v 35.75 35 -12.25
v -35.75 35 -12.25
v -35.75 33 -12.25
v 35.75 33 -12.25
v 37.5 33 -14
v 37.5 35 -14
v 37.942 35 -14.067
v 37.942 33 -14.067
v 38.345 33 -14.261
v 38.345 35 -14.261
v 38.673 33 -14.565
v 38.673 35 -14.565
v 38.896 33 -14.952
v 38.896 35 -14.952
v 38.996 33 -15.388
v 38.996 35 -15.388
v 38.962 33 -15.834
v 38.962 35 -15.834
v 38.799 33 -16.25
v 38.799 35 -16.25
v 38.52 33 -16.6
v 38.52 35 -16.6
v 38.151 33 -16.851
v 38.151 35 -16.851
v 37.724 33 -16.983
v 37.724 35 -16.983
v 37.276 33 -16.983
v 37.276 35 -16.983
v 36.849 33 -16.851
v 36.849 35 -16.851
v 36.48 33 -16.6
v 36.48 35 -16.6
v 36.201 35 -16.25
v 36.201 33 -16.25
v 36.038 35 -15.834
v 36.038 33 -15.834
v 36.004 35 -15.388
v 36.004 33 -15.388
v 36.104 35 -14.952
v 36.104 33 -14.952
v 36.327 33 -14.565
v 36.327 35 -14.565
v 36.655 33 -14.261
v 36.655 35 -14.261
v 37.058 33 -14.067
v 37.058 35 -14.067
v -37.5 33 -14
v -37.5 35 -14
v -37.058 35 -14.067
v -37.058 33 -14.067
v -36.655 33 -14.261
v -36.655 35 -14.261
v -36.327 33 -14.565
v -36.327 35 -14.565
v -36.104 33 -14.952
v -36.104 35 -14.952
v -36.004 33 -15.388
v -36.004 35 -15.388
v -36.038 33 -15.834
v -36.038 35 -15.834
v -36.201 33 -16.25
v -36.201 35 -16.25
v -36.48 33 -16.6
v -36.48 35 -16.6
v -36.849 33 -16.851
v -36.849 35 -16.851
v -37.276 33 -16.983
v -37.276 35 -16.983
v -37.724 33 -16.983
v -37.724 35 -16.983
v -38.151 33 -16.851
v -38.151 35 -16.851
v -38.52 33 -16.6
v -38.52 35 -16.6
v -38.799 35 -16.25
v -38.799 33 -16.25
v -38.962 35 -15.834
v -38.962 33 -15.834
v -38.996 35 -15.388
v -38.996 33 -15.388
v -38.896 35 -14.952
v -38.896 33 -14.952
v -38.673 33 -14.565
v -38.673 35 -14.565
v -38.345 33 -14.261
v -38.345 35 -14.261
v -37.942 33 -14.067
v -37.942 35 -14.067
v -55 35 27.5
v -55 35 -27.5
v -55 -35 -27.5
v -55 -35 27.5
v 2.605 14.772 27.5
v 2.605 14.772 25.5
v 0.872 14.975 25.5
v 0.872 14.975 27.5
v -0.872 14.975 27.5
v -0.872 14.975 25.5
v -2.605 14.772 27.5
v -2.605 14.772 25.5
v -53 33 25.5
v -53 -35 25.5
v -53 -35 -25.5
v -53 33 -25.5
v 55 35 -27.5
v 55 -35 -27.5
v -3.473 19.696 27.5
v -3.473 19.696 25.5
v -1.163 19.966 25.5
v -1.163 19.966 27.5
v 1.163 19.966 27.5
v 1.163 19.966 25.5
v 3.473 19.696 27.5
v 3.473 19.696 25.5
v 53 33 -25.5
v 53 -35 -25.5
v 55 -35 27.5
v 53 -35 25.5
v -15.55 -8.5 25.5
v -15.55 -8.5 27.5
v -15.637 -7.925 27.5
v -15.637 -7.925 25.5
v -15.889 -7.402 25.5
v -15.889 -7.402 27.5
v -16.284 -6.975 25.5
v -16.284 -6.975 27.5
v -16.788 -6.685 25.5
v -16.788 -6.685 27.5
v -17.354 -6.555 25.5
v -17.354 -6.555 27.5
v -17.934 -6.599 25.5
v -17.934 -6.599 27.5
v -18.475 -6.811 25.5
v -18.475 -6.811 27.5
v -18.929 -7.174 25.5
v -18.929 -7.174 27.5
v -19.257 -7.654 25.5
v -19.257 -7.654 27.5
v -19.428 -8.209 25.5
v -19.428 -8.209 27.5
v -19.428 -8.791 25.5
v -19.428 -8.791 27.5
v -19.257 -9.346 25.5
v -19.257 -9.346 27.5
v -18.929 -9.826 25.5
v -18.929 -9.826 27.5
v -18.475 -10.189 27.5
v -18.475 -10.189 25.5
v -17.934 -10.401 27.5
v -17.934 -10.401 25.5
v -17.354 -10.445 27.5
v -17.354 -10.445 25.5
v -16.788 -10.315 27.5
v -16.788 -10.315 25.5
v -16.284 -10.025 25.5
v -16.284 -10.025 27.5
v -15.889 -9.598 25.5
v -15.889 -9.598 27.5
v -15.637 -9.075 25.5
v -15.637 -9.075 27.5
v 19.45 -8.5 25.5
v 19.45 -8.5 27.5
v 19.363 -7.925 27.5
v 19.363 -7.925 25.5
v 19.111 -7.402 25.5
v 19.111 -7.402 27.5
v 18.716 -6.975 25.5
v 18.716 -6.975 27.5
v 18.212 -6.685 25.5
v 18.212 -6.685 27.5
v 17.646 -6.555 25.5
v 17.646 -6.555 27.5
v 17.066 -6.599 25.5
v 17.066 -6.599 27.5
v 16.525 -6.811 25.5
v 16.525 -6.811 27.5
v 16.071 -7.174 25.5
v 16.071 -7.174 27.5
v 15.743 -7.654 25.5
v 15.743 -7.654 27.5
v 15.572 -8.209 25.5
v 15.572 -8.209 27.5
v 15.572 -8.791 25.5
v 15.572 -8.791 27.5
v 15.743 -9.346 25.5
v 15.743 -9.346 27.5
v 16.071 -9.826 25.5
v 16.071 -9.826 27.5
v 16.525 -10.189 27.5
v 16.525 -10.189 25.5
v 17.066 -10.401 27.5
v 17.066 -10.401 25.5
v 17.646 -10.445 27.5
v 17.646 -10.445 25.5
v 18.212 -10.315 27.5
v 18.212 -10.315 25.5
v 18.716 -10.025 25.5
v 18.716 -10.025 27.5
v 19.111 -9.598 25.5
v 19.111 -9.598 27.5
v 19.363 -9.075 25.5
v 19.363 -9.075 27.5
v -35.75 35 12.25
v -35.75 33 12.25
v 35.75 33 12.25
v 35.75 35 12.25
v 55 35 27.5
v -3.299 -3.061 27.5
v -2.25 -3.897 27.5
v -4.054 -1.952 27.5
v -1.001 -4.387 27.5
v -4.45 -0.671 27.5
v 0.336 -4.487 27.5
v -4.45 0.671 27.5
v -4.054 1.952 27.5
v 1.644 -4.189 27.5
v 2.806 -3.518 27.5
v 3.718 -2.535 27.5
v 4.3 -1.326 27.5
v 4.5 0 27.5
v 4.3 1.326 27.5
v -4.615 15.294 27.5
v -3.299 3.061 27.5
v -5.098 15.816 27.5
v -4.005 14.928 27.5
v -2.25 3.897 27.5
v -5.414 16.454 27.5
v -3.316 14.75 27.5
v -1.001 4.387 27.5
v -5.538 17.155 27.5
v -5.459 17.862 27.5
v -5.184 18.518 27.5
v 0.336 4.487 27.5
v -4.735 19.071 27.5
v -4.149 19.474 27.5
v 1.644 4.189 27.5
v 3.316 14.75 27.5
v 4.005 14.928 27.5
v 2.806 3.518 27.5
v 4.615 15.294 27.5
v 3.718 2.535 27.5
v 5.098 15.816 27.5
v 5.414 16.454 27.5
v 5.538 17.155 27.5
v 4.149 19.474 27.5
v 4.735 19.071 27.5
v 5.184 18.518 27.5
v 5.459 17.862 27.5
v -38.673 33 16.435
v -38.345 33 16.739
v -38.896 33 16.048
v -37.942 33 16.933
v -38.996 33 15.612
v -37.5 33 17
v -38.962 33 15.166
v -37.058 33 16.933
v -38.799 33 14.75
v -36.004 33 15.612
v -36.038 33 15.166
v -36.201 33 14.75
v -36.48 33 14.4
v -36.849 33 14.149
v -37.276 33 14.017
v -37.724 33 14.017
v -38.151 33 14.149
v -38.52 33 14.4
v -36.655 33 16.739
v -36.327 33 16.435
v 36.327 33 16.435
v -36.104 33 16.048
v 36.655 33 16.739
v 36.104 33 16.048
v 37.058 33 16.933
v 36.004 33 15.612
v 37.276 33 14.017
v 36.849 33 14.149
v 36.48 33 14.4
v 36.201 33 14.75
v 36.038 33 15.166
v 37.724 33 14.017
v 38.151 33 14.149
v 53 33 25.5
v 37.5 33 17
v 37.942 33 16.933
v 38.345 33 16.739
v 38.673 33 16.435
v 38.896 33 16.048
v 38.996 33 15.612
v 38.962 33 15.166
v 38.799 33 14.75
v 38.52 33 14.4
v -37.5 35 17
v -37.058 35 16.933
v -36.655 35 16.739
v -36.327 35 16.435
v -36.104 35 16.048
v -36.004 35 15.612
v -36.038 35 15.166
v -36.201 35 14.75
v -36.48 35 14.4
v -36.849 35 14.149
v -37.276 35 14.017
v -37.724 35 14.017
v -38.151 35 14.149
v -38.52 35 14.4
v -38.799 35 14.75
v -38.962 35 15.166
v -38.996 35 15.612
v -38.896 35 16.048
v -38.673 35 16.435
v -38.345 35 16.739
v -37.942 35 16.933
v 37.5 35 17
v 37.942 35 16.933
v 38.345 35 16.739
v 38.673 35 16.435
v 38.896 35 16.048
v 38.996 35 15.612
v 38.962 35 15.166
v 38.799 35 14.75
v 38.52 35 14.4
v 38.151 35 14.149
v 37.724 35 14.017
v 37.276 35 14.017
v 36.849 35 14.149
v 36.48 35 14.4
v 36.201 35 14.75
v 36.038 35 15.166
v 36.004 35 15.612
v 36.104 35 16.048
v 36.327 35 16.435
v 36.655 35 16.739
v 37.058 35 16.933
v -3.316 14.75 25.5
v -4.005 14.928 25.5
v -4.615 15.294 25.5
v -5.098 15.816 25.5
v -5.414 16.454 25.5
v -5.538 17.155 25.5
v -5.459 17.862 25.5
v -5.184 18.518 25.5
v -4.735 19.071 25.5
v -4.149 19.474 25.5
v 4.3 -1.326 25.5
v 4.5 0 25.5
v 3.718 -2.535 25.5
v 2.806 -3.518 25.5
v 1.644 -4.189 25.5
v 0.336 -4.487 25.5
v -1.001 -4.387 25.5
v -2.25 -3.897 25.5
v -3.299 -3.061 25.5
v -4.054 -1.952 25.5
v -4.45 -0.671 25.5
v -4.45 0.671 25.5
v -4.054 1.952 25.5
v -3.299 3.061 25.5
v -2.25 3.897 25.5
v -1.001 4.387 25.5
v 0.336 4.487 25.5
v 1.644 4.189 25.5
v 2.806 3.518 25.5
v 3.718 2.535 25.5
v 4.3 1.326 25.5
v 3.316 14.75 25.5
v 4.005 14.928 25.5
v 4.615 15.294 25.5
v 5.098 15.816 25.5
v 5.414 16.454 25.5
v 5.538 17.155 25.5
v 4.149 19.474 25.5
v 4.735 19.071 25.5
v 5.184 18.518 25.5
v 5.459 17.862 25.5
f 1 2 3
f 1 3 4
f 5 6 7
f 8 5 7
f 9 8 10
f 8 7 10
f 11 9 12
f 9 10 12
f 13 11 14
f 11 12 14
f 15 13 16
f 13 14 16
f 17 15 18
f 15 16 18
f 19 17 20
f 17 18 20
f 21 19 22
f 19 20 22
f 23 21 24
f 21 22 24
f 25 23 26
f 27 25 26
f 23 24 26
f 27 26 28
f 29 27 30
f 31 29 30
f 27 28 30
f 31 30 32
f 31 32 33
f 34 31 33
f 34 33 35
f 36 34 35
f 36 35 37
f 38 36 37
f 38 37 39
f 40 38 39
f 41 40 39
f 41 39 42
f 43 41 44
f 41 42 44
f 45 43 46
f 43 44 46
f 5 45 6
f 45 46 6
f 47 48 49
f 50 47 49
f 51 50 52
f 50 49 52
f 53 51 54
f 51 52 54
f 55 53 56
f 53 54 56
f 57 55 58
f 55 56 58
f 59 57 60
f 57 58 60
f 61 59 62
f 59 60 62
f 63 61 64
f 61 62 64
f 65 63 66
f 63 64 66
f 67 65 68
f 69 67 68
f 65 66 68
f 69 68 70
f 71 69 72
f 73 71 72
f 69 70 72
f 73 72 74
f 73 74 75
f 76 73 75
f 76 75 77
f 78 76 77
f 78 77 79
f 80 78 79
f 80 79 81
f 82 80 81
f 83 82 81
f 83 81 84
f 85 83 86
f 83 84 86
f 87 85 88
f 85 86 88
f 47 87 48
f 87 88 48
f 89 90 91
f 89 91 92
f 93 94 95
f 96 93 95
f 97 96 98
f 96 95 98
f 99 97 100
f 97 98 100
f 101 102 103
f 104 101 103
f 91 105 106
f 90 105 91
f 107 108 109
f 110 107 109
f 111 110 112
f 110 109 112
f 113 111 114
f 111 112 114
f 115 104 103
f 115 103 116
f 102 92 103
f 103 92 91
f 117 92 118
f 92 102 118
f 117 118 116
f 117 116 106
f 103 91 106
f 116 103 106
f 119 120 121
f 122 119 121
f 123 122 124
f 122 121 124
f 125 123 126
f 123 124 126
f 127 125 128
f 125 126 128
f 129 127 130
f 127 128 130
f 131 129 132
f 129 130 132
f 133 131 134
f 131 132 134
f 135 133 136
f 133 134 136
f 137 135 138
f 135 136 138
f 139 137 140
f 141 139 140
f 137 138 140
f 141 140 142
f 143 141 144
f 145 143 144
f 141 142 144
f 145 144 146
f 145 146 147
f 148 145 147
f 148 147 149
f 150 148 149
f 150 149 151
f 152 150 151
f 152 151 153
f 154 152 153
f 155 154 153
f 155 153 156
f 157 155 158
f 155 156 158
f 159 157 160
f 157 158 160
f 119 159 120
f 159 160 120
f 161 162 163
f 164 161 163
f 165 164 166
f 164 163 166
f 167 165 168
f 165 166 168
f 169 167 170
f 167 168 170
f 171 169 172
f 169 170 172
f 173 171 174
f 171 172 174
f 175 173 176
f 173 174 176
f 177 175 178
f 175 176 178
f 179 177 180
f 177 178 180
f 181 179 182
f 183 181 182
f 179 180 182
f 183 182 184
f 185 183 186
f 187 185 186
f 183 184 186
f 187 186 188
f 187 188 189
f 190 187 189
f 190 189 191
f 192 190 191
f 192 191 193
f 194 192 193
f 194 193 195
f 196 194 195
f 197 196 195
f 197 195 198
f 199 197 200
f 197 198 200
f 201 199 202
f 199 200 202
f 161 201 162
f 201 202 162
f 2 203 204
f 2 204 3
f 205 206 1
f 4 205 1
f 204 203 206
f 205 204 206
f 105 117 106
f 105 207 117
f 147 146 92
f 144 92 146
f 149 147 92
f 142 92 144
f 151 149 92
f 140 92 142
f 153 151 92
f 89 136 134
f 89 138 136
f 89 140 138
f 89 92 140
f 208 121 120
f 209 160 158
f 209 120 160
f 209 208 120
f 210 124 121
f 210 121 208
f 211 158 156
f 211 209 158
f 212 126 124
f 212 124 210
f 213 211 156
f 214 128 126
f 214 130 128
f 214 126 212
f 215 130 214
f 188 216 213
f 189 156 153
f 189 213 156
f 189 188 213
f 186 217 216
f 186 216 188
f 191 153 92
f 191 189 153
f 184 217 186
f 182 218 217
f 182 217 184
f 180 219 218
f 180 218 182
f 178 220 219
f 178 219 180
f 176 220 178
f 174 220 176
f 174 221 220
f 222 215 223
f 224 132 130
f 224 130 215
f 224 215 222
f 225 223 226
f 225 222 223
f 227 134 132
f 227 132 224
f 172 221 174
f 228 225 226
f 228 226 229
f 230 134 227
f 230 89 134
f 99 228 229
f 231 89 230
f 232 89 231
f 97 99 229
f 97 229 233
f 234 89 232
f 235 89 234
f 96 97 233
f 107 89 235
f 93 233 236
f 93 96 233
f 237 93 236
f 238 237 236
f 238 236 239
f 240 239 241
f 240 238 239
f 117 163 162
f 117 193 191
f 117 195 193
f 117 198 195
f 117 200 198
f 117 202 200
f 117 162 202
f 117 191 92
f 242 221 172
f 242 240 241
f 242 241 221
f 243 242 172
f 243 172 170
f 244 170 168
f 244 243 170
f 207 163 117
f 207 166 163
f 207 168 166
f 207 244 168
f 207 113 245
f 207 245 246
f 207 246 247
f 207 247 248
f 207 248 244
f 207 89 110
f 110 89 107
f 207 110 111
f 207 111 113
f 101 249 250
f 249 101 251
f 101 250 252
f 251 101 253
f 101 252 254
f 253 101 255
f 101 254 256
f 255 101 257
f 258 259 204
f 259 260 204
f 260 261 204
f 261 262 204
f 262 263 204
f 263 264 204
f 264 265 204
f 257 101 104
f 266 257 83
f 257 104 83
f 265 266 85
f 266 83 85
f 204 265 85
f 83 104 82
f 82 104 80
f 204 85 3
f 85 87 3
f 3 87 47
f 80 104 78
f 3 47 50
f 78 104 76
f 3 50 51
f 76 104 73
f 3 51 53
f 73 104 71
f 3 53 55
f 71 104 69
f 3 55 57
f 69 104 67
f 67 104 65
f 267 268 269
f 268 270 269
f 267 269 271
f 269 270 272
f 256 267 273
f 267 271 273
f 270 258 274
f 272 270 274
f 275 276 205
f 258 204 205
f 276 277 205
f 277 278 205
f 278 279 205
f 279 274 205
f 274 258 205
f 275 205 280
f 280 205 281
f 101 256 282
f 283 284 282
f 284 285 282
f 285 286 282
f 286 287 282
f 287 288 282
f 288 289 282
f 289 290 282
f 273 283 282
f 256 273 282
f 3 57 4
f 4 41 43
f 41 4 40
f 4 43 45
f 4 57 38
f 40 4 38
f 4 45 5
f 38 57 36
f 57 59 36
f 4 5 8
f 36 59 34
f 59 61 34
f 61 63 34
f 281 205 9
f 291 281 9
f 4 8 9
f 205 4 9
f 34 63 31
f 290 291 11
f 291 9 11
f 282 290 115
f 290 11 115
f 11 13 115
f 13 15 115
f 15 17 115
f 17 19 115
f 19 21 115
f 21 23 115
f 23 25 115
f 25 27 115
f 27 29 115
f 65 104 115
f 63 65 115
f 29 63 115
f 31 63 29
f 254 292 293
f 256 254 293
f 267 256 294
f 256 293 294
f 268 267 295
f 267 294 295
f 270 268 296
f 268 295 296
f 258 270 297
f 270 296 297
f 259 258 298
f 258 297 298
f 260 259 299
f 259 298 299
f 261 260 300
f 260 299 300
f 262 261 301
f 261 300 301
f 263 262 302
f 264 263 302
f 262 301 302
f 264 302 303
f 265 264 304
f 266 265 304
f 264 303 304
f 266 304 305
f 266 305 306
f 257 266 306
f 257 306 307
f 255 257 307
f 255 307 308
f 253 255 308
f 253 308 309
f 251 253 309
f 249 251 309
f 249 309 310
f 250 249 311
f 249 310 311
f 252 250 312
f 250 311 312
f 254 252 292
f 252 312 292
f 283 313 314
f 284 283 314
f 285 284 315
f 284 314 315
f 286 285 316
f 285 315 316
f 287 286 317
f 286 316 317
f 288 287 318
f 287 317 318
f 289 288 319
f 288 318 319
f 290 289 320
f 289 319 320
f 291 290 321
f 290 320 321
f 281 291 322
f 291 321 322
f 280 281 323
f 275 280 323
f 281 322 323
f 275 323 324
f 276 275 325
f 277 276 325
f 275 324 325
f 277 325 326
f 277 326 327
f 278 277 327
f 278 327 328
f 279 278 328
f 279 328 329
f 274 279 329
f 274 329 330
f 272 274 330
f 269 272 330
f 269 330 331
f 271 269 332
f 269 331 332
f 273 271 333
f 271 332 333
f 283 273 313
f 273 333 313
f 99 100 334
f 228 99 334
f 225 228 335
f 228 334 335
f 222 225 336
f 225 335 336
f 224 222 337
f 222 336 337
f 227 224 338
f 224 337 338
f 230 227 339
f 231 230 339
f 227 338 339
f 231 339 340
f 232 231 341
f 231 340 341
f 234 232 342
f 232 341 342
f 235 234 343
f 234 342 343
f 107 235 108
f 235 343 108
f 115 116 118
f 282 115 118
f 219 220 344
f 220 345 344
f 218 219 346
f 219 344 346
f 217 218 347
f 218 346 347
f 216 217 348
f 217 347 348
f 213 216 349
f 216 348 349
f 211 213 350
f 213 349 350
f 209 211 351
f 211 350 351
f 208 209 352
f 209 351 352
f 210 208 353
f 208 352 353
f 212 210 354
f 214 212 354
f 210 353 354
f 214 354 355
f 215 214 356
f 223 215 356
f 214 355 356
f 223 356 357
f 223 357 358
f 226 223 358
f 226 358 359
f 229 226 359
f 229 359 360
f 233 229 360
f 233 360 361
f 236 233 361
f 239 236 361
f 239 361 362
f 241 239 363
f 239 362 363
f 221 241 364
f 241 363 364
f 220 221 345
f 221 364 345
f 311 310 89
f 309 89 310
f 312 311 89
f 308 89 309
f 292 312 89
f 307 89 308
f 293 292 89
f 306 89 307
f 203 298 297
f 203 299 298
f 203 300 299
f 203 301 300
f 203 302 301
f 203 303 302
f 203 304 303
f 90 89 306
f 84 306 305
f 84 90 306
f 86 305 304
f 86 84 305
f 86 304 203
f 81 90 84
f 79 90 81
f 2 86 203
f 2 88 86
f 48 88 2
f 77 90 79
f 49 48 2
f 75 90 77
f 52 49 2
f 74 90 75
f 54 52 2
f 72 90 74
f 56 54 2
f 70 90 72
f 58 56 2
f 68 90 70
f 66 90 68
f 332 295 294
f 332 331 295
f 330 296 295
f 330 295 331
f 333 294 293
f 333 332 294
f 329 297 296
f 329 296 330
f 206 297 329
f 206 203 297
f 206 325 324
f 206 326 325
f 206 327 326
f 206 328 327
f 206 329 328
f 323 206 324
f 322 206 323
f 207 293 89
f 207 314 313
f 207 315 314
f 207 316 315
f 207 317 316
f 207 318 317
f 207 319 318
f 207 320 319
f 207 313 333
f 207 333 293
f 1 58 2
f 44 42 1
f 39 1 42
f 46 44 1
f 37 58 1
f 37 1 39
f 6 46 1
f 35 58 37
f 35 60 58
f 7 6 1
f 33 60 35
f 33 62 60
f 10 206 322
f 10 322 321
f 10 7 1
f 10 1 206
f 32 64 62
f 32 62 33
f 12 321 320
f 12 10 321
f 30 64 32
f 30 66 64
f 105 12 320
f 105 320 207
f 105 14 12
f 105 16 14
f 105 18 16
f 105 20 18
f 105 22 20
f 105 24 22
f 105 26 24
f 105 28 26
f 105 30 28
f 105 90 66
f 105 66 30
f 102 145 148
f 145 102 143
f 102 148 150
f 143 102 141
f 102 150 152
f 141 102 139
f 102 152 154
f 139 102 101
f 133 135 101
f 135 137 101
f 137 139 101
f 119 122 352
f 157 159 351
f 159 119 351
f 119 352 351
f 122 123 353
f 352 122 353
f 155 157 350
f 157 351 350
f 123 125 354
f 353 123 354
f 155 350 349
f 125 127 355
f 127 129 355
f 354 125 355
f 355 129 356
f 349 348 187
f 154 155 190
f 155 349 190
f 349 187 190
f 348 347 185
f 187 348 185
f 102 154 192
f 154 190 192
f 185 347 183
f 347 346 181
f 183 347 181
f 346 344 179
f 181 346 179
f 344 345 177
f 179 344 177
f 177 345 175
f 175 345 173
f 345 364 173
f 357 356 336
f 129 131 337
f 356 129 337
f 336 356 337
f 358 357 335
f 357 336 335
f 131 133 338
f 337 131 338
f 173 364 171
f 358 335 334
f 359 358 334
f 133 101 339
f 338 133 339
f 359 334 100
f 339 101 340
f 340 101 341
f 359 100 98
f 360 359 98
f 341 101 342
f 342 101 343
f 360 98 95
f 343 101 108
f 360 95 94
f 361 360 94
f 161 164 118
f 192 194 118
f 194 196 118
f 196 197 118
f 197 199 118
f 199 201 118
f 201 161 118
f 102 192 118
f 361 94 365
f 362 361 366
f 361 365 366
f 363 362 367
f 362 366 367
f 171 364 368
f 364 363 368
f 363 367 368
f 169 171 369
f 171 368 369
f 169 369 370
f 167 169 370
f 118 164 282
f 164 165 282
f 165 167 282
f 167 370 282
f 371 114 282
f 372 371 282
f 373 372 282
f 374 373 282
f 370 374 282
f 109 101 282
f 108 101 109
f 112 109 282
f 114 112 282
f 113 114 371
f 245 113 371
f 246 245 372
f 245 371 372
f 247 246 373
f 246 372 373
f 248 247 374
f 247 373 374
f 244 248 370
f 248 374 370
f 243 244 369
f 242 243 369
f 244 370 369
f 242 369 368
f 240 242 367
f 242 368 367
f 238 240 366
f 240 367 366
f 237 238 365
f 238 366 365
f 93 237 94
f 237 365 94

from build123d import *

# Parameters (mm, degrees)
SKETCH1_W           = 4.5
SKETCH1_H           = 2
BOSS_EXTRUDE1_DEPTH = 35
BOSS_EXTRUDE2_START = 35
SKETCH1_3_R         = 1.5
SKETCH1_3_W         = 71.5
SKETCH1_3_H         = 24.5
BOSS_EXTRUDE2_DEPTH = 2
SKETCH1_5_W         = 4.5
SKETCH1_5_H         = 2
SKETCH3_R           = 2
CUT_EXTRUDE1_DEPTH  = 2
MOVE_FACE1_BY       = 0.05
MOVE_FACE1_2_BY     = 0.05
CUT_EXTRUDE2_DEPTH  = 85.017855245


with BuildPart() as part:
    # Sketch1 → Boss-Extrude1 (new, symmetric)
    with BuildSketch(Plane(origin=(0, 0, 0), x_dir=(1, 0, 0), z_dir=(0, 1, 0))):
        Polygon((-53, 25.5), (53, 25.5), (53, -25.5), (14, -25.5), (0, -25.5), (0, -27.5), (55, -27.5), (55, 27.5), (-55, 27.5), (-55, -27.5), (-4.5, -27.5), (-4.5, -25.5), (-14, -25.5), (-53, -25.5), align=None)
        with Locations((-2.25, -26.5)):
            Rectangle(SKETCH1_W, SKETCH1_H)
    extrude(amount=BOSS_EXTRUDE1_DEPTH, both=True)

    # Sketch1<3> → Boss-Extrude2 (add)
    with BuildSketch(Plane(origin=(0, 0, 0), x_dir=(1, 0, 0), z_dir=(0, 1, 0)).offset(BOSS_EXTRUDE2_START)):
        Polygon((53, -25.5), (53, 25.5), (-53, 25.5), (-53, -25.5), (-14, -25.5), (-4.5, -25.5), (0, -25.5), (14, -25.5), align=None)
        with Locations(Location((-37.5, -15.5, 0), (0, 0, 270))):
            Circle(SKETCH1_3_R, mode=Mode.SUBTRACT)
        with Locations(Location((37.5, -15.5, 0), (0, 0, 270))):
            Circle(SKETCH1_3_R, mode=Mode.SUBTRACT)
        Rectangle(SKETCH1_3_W, SKETCH1_3_H, mode=Mode.SUBTRACT)
        with Locations(Location((-37.5, 15.5, 0), (0, 0, 270))):
            Circle(SKETCH1_3_R, mode=Mode.SUBTRACT)
        with Locations(Location((37.5, 15.5, 0), (0, 0, 270))):
            Circle(SKETCH1_3_R, mode=Mode.SUBTRACT)
    extrude(amount=-BOSS_EXTRUDE2_DEPTH)

    # Sketch1<5> → Cut-Revolve1 (revolve, cut)
    with BuildSketch(Plane(origin=(0, 0, 0), x_dir=(1, 0, 0), z_dir=(0, 1, 0)), mode=Mode.PRIVATE) as cut_revolve1_sk:
        with Locations((-2.25, -26.5)):
            Rectangle(SKETCH1_5_W, SKETCH1_5_H)
    revolve(cut_revolve1_sk.sketch.rotate(Axis((0, 0, 6), (0, 0, -1)), 180), axis=Axis((0, 0, 6), (0, 0, -1)), mode=Mode.SUBTRACT)

    # Sketch3 → Cut-Extrude1 (cut)
    with BuildSketch(Plane.XY.offset(27.5)):
        with Locations((-17.5, -8.5)):
            Circle(SKETCH3_R)
        with Locations((17.5, -8.5)):
            Circle(SKETCH3_R)
    extrude(amount=-CUT_EXTRUDE1_DEPTH, mode=Mode.SUBTRACT)

    # Move Face1: a curved face moved outward by 0.05
    add(Solid.thicken(part.faces().sort_by_distance((15.5, -8.5, 26.5))[0], MOVE_FACE1_BY))

    # Move Face1 2: a curved face moved outward by 0.05
    add(Solid.thicken(part.faces().sort_by_distance((-19.5, -8.5, 26.5))[0], MOVE_FACE1_2_BY))

    # Sketch5 → Cut-Extrude2 (cut, through all)
    with BuildSketch(Plane(origin=(0, 0, 25.5), x_dir=(-1, 0, 0), z_dir=(0, 0, -1))):
        with BuildLine():
            Line((3.472963553, 19.69615506), (2.604722665, 14.772116295))
            ThreePointArc((2.604722665, 14.772116295), (5.500862492, 16.800015234), (3.472963553, 19.69615506))
        make_face()
        with BuildLine():
            ThreePointArc((-2.604722665, 14.772116295), (0, 15), (2.604722665, 14.772116295))
            Line((2.604722665, 14.772116295), (3.472963553, 19.69615506))
            ThreePointArc((3.472963553, 19.69615506), (0, 20), (-3.472963553, 19.69615506))
            Line((-3.472963553, 19.69615506), (-2.604722665, 14.772116295))
        make_face()
        with BuildLine():
            ThreePointArc((-3.472963553, 19.69615506), (-5.500862492, 16.800015234), (-2.604722665, 14.772116295))
            Line((-2.604722665, 14.772116295), (-3.472963553, 19.69615506))
        make_face()
    extrude(amount=-CUT_EXTRUDE2_DEPTH, mode=Mode.SUBTRACT)


solid = part.part
